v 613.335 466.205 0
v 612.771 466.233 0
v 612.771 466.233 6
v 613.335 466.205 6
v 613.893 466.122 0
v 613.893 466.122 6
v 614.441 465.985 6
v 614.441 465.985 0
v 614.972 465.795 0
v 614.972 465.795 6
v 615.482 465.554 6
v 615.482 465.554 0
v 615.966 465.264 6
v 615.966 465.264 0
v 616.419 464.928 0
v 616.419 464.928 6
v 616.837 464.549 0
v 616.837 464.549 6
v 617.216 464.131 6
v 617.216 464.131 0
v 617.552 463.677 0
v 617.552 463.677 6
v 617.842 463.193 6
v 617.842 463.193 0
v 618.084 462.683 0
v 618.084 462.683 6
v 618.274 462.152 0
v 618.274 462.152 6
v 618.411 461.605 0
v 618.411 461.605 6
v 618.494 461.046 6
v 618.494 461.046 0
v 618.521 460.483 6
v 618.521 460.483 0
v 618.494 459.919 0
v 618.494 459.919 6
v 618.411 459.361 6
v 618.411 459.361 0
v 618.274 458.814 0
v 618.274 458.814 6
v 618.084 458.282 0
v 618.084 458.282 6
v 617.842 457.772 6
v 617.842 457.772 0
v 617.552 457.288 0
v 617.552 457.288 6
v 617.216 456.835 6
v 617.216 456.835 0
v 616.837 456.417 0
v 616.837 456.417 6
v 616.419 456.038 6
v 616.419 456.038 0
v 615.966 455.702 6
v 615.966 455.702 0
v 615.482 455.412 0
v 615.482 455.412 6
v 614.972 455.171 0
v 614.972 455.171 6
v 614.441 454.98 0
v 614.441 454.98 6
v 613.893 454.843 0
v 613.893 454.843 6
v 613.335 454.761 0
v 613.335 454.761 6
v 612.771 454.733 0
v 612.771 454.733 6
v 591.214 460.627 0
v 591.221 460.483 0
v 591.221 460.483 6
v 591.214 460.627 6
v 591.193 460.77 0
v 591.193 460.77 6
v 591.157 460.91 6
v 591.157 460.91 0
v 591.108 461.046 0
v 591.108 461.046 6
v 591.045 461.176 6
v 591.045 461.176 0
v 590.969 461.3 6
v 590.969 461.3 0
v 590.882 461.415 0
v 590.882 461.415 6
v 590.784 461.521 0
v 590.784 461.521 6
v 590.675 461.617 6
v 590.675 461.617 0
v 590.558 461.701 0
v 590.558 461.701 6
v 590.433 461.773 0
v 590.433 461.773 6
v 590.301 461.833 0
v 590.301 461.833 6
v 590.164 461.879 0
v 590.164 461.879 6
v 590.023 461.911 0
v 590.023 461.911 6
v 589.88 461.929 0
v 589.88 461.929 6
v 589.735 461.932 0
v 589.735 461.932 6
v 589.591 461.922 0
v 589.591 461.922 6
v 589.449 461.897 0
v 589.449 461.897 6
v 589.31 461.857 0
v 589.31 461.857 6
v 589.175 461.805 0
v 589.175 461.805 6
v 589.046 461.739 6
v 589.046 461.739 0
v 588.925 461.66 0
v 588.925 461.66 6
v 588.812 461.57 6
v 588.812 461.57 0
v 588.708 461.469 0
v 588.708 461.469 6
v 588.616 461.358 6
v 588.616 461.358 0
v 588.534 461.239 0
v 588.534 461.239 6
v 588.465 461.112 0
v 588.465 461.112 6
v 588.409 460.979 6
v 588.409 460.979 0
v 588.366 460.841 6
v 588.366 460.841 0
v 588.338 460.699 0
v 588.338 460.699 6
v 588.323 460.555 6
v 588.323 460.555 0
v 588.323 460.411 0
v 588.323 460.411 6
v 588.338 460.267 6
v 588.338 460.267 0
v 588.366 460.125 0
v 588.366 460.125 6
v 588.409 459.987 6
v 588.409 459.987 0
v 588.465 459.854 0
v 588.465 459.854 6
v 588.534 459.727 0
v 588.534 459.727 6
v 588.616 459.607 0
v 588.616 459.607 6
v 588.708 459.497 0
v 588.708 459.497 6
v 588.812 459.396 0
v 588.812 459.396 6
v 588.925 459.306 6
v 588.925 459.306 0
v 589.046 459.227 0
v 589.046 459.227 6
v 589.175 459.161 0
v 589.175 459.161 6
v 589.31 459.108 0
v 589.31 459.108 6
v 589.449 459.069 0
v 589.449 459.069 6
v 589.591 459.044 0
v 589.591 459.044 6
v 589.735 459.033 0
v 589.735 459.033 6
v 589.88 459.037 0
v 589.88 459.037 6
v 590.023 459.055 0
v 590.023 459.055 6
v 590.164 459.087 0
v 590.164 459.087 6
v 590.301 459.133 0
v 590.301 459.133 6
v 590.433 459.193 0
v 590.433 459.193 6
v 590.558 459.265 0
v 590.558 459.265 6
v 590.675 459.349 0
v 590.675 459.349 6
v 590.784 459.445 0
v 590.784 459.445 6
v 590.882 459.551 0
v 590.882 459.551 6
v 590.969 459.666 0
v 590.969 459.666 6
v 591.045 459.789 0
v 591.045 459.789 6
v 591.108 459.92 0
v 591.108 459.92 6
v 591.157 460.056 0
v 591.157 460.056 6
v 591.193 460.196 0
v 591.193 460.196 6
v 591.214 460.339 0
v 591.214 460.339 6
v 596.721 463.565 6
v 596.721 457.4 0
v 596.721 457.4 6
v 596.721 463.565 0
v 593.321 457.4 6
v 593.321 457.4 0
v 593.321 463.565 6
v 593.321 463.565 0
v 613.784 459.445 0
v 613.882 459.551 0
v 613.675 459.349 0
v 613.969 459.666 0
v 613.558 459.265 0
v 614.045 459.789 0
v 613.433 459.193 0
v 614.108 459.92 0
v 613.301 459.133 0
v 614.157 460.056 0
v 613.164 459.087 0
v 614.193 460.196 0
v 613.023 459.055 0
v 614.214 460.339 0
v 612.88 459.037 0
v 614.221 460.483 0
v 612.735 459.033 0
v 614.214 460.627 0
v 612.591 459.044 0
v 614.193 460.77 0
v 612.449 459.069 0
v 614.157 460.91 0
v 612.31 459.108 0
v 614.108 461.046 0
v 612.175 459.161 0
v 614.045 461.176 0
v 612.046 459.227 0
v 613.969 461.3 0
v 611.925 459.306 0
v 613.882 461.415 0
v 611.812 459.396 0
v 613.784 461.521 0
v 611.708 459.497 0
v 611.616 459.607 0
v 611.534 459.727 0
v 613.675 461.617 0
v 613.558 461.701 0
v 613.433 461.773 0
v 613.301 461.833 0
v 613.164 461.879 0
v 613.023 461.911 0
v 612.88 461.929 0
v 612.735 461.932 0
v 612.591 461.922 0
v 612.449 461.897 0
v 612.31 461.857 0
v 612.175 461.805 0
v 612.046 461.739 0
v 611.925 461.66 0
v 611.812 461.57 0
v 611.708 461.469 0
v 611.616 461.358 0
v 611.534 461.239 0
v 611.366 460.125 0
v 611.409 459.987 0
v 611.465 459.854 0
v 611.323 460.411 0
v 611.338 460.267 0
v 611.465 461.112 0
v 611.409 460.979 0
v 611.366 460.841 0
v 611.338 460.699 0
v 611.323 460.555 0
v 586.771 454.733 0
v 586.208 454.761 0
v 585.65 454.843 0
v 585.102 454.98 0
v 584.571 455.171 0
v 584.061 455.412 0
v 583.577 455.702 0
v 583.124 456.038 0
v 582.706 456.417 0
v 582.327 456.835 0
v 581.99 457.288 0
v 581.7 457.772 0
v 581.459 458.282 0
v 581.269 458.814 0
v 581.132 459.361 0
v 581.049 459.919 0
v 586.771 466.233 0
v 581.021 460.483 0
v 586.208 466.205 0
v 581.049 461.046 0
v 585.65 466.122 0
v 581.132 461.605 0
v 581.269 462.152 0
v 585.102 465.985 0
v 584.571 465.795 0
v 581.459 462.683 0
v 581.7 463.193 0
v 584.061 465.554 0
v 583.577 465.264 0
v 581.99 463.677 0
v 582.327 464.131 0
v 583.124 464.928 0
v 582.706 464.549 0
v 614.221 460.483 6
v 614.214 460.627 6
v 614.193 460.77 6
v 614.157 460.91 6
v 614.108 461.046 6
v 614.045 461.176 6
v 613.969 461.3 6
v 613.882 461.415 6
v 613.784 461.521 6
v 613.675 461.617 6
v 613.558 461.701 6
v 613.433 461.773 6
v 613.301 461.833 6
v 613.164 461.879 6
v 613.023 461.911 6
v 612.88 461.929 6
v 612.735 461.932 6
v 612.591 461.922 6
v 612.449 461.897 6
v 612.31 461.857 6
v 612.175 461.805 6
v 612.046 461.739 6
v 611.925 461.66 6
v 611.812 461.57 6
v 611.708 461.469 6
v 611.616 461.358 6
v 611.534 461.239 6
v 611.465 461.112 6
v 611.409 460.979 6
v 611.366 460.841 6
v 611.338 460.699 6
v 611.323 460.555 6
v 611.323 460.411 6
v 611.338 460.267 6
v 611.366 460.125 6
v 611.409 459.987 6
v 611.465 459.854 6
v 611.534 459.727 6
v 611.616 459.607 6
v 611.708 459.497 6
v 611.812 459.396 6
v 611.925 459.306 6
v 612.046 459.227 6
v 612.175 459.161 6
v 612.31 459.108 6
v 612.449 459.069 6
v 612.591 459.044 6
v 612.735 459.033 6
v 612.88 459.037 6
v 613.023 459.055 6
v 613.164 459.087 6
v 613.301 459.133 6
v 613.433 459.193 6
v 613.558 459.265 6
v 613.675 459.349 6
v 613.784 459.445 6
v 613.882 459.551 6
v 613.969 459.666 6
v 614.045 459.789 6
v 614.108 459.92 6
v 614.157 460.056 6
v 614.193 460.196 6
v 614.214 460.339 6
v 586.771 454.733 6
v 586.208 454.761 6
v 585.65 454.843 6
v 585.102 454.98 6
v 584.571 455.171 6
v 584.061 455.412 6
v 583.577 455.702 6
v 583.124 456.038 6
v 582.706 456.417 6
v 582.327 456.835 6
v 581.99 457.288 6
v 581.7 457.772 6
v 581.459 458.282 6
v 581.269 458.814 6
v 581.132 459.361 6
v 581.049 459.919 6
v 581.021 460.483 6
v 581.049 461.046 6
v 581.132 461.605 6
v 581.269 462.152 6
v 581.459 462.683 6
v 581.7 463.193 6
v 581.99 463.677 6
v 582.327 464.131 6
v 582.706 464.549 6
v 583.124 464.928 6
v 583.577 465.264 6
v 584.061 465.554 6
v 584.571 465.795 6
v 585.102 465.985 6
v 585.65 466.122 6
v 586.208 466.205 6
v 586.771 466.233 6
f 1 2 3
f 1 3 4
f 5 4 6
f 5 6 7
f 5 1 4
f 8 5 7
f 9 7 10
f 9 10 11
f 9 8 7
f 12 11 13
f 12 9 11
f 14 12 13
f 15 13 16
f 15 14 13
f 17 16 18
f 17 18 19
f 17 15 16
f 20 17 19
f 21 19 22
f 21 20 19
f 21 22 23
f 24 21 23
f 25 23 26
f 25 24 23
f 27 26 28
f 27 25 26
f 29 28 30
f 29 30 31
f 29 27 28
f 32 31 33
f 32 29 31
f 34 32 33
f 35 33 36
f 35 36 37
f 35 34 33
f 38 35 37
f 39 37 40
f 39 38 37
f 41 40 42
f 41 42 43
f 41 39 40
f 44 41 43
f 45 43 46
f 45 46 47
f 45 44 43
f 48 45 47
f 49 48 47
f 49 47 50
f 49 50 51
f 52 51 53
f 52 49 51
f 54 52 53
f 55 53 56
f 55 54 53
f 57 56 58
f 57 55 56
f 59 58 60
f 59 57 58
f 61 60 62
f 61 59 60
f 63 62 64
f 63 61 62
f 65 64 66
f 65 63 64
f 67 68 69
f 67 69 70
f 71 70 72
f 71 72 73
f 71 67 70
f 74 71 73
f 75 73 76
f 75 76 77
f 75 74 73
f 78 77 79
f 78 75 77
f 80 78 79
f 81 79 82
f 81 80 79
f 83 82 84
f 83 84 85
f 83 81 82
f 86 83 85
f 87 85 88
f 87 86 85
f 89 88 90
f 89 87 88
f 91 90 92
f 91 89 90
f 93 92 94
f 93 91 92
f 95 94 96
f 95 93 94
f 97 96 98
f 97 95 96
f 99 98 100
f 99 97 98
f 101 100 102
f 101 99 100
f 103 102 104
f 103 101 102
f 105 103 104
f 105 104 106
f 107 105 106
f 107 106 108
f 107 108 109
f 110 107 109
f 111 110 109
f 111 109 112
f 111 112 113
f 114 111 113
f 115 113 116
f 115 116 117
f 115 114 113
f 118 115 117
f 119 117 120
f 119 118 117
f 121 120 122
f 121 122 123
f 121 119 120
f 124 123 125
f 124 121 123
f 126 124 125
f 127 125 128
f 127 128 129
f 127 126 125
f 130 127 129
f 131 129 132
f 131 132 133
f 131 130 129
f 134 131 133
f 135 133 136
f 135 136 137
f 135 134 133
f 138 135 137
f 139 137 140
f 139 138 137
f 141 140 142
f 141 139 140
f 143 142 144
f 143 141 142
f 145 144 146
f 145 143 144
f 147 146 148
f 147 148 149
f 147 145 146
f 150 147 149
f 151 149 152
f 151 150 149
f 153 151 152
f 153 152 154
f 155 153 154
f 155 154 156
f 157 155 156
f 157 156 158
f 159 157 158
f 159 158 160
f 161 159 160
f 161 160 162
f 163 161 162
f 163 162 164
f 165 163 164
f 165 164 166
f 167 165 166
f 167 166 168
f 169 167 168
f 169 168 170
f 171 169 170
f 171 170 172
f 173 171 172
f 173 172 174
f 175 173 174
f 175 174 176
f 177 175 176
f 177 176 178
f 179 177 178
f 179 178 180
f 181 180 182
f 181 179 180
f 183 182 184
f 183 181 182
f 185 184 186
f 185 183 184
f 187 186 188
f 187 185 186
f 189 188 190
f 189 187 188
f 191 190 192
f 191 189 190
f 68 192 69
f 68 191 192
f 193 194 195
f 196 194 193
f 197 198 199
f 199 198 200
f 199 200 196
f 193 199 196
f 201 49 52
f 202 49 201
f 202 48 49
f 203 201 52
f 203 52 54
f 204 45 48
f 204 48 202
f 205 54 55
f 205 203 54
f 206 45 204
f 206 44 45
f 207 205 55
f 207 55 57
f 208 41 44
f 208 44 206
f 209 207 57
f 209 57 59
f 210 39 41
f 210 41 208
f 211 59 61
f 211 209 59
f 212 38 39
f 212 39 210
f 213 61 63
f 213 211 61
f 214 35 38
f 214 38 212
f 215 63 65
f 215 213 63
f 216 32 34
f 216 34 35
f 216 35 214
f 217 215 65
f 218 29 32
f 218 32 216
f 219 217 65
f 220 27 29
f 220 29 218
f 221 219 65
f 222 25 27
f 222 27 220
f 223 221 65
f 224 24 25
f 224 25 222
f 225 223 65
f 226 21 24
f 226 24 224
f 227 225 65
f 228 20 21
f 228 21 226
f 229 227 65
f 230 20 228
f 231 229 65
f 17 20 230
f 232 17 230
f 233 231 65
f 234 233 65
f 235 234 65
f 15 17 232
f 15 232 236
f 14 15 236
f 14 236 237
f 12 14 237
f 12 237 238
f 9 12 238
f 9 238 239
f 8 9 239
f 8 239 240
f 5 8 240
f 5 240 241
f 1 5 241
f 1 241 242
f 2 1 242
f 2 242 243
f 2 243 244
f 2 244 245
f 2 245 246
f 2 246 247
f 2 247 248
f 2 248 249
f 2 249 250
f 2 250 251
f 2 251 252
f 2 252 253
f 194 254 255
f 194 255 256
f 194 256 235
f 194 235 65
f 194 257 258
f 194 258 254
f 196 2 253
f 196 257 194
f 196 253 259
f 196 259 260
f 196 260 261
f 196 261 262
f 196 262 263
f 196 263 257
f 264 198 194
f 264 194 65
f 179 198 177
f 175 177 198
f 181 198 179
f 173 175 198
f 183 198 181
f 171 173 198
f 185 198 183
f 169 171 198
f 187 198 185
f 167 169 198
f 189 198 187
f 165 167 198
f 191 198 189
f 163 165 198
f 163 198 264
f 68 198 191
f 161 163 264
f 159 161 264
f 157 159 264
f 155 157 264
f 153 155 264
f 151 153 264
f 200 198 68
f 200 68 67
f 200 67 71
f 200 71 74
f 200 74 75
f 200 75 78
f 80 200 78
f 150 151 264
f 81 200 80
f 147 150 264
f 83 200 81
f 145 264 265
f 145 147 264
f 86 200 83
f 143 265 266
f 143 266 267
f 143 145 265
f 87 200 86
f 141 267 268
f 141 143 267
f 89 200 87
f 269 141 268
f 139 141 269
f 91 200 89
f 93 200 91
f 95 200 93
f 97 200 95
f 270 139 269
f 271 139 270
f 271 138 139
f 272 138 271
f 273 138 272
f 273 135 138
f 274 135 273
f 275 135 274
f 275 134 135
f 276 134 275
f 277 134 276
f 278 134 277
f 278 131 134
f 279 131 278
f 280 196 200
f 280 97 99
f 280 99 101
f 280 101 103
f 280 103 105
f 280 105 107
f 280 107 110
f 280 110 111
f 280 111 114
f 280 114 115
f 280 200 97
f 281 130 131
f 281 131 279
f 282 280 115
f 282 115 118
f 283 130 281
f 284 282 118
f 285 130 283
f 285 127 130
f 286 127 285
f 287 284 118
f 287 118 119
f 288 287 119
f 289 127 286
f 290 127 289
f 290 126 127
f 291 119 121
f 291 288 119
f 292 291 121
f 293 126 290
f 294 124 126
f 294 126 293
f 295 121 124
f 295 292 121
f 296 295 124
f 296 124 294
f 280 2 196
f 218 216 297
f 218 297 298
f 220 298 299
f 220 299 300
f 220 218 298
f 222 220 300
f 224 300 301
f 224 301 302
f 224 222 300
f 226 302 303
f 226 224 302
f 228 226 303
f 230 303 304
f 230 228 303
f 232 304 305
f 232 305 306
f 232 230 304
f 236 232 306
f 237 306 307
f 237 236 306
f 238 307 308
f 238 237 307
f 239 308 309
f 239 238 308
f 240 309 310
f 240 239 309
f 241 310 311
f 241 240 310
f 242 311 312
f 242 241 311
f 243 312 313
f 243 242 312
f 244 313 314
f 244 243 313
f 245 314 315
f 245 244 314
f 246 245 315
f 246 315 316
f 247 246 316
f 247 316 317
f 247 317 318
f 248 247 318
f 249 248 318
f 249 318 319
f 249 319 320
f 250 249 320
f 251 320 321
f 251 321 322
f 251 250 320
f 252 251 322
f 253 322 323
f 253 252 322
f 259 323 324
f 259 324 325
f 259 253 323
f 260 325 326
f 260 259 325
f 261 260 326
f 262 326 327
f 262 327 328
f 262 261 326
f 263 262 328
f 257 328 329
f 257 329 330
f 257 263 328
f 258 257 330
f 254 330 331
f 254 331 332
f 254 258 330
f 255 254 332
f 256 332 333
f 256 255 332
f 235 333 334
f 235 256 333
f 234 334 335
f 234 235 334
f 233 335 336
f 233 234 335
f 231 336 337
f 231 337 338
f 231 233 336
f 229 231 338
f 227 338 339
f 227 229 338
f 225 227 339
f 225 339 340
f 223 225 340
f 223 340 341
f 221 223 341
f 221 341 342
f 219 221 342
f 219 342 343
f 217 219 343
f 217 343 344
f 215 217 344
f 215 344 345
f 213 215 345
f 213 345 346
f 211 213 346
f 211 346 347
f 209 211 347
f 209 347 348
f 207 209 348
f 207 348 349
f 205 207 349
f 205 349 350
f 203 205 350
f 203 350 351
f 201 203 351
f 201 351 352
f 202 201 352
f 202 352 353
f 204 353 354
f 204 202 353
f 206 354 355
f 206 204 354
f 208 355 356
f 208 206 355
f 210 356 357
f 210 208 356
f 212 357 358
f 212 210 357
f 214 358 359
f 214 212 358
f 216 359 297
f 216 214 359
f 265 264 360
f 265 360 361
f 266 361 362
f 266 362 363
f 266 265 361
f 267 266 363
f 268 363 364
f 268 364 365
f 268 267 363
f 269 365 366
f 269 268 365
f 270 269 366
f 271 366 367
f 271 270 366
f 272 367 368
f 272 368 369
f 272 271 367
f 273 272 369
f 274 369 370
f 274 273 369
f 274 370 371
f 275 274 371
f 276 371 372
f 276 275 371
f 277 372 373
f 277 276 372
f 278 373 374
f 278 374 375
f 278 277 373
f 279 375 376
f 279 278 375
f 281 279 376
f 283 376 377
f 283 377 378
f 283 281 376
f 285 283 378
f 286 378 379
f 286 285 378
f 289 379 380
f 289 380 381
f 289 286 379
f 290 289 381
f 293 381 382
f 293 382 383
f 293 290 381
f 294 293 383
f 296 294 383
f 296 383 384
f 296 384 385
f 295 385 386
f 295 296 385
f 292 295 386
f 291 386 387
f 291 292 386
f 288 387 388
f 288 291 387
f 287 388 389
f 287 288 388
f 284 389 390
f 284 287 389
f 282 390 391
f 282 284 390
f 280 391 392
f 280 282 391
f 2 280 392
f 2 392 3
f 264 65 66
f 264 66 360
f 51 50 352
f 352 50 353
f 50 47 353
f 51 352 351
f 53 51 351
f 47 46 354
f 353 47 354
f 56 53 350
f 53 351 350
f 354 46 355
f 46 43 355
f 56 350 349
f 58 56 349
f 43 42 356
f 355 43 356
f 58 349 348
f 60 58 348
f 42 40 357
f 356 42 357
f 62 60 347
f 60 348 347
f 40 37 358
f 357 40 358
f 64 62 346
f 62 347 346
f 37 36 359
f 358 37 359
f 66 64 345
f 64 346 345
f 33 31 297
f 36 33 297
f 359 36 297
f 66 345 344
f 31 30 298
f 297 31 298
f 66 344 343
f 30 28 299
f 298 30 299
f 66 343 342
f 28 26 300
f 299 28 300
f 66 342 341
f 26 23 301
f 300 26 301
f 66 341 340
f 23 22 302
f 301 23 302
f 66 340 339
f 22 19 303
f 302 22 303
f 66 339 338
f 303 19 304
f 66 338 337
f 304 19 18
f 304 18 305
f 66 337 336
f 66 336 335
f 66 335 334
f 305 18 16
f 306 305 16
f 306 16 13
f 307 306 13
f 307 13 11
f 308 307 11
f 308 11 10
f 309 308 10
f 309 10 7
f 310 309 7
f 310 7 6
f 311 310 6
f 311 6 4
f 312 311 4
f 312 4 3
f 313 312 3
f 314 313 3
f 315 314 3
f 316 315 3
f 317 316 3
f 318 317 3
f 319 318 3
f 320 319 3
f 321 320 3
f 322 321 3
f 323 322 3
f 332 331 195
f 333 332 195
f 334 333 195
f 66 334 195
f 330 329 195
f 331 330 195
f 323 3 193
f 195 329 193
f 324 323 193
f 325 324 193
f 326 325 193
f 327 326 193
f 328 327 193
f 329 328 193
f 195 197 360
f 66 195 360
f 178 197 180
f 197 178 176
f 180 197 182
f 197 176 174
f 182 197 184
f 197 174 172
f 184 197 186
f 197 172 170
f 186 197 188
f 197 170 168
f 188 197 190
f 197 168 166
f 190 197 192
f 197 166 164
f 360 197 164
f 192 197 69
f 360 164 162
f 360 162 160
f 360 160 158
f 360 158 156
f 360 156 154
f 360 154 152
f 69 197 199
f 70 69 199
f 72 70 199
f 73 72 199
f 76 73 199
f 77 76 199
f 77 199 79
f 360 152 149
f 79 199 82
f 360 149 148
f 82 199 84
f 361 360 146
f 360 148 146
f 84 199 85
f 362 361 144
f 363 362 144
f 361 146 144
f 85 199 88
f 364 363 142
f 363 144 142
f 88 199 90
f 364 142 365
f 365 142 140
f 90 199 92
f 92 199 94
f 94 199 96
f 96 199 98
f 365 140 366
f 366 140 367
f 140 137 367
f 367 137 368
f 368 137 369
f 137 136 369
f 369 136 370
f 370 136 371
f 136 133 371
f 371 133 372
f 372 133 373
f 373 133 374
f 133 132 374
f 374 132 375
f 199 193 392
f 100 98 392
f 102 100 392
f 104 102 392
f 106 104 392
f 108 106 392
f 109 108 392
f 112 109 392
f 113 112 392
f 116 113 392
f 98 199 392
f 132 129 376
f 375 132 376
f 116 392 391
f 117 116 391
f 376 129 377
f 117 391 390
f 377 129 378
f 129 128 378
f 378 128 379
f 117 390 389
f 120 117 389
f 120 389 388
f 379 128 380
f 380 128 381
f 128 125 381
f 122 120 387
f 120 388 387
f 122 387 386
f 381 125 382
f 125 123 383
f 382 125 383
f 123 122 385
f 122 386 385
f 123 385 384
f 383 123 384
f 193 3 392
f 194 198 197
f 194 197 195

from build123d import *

# Parameters (mm, degrees)
SKETCH1_R           = 1.45
SKETCH1_W           = 3.4
SKETCH1_H           = 6.165
BOSS_EXTRUDE1_DEPTH = 6


with BuildPart() as part:
    # Sketch1 → Boss-Extrude1 (new body)
    with BuildSketch(Plane.XY):
        with BuildLine():
            Line((589.771388, 466.232899), (612.771388, 466.232899))
            ThreePointArc((612.771388, 466.232899), (618.521388, 460.482899), (612.771388, 454.732899))
            Line((612.771388, 454.732899), (589.771388, 454.732899))
            Line((589.771388, 454.732899), (586.771388, 454.732899))
            ThreePointArc((586.771388, 454.732899), (581.021388, 460.482899), (586.771388, 466.232899))
            Line((586.771388, 466.232899), (589.771388, 466.232899))
        make_face()
        with Locations((589.771388, 460.482899)):
            Circle(SKETCH1_R, mode=Mode.SUBTRACT)
        with Locations((612.771388, 460.482899)):
            Circle(SKETCH1_R, mode=Mode.SUBTRACT)
        with Locations((595.021388, 460.482899)):
            Rectangle(SKETCH1_W, SKETCH1_H, mode=Mode.SUBTRACT)
    extrude(amount=BOSS_EXTRUDE1_DEPTH)


solid = part.part
